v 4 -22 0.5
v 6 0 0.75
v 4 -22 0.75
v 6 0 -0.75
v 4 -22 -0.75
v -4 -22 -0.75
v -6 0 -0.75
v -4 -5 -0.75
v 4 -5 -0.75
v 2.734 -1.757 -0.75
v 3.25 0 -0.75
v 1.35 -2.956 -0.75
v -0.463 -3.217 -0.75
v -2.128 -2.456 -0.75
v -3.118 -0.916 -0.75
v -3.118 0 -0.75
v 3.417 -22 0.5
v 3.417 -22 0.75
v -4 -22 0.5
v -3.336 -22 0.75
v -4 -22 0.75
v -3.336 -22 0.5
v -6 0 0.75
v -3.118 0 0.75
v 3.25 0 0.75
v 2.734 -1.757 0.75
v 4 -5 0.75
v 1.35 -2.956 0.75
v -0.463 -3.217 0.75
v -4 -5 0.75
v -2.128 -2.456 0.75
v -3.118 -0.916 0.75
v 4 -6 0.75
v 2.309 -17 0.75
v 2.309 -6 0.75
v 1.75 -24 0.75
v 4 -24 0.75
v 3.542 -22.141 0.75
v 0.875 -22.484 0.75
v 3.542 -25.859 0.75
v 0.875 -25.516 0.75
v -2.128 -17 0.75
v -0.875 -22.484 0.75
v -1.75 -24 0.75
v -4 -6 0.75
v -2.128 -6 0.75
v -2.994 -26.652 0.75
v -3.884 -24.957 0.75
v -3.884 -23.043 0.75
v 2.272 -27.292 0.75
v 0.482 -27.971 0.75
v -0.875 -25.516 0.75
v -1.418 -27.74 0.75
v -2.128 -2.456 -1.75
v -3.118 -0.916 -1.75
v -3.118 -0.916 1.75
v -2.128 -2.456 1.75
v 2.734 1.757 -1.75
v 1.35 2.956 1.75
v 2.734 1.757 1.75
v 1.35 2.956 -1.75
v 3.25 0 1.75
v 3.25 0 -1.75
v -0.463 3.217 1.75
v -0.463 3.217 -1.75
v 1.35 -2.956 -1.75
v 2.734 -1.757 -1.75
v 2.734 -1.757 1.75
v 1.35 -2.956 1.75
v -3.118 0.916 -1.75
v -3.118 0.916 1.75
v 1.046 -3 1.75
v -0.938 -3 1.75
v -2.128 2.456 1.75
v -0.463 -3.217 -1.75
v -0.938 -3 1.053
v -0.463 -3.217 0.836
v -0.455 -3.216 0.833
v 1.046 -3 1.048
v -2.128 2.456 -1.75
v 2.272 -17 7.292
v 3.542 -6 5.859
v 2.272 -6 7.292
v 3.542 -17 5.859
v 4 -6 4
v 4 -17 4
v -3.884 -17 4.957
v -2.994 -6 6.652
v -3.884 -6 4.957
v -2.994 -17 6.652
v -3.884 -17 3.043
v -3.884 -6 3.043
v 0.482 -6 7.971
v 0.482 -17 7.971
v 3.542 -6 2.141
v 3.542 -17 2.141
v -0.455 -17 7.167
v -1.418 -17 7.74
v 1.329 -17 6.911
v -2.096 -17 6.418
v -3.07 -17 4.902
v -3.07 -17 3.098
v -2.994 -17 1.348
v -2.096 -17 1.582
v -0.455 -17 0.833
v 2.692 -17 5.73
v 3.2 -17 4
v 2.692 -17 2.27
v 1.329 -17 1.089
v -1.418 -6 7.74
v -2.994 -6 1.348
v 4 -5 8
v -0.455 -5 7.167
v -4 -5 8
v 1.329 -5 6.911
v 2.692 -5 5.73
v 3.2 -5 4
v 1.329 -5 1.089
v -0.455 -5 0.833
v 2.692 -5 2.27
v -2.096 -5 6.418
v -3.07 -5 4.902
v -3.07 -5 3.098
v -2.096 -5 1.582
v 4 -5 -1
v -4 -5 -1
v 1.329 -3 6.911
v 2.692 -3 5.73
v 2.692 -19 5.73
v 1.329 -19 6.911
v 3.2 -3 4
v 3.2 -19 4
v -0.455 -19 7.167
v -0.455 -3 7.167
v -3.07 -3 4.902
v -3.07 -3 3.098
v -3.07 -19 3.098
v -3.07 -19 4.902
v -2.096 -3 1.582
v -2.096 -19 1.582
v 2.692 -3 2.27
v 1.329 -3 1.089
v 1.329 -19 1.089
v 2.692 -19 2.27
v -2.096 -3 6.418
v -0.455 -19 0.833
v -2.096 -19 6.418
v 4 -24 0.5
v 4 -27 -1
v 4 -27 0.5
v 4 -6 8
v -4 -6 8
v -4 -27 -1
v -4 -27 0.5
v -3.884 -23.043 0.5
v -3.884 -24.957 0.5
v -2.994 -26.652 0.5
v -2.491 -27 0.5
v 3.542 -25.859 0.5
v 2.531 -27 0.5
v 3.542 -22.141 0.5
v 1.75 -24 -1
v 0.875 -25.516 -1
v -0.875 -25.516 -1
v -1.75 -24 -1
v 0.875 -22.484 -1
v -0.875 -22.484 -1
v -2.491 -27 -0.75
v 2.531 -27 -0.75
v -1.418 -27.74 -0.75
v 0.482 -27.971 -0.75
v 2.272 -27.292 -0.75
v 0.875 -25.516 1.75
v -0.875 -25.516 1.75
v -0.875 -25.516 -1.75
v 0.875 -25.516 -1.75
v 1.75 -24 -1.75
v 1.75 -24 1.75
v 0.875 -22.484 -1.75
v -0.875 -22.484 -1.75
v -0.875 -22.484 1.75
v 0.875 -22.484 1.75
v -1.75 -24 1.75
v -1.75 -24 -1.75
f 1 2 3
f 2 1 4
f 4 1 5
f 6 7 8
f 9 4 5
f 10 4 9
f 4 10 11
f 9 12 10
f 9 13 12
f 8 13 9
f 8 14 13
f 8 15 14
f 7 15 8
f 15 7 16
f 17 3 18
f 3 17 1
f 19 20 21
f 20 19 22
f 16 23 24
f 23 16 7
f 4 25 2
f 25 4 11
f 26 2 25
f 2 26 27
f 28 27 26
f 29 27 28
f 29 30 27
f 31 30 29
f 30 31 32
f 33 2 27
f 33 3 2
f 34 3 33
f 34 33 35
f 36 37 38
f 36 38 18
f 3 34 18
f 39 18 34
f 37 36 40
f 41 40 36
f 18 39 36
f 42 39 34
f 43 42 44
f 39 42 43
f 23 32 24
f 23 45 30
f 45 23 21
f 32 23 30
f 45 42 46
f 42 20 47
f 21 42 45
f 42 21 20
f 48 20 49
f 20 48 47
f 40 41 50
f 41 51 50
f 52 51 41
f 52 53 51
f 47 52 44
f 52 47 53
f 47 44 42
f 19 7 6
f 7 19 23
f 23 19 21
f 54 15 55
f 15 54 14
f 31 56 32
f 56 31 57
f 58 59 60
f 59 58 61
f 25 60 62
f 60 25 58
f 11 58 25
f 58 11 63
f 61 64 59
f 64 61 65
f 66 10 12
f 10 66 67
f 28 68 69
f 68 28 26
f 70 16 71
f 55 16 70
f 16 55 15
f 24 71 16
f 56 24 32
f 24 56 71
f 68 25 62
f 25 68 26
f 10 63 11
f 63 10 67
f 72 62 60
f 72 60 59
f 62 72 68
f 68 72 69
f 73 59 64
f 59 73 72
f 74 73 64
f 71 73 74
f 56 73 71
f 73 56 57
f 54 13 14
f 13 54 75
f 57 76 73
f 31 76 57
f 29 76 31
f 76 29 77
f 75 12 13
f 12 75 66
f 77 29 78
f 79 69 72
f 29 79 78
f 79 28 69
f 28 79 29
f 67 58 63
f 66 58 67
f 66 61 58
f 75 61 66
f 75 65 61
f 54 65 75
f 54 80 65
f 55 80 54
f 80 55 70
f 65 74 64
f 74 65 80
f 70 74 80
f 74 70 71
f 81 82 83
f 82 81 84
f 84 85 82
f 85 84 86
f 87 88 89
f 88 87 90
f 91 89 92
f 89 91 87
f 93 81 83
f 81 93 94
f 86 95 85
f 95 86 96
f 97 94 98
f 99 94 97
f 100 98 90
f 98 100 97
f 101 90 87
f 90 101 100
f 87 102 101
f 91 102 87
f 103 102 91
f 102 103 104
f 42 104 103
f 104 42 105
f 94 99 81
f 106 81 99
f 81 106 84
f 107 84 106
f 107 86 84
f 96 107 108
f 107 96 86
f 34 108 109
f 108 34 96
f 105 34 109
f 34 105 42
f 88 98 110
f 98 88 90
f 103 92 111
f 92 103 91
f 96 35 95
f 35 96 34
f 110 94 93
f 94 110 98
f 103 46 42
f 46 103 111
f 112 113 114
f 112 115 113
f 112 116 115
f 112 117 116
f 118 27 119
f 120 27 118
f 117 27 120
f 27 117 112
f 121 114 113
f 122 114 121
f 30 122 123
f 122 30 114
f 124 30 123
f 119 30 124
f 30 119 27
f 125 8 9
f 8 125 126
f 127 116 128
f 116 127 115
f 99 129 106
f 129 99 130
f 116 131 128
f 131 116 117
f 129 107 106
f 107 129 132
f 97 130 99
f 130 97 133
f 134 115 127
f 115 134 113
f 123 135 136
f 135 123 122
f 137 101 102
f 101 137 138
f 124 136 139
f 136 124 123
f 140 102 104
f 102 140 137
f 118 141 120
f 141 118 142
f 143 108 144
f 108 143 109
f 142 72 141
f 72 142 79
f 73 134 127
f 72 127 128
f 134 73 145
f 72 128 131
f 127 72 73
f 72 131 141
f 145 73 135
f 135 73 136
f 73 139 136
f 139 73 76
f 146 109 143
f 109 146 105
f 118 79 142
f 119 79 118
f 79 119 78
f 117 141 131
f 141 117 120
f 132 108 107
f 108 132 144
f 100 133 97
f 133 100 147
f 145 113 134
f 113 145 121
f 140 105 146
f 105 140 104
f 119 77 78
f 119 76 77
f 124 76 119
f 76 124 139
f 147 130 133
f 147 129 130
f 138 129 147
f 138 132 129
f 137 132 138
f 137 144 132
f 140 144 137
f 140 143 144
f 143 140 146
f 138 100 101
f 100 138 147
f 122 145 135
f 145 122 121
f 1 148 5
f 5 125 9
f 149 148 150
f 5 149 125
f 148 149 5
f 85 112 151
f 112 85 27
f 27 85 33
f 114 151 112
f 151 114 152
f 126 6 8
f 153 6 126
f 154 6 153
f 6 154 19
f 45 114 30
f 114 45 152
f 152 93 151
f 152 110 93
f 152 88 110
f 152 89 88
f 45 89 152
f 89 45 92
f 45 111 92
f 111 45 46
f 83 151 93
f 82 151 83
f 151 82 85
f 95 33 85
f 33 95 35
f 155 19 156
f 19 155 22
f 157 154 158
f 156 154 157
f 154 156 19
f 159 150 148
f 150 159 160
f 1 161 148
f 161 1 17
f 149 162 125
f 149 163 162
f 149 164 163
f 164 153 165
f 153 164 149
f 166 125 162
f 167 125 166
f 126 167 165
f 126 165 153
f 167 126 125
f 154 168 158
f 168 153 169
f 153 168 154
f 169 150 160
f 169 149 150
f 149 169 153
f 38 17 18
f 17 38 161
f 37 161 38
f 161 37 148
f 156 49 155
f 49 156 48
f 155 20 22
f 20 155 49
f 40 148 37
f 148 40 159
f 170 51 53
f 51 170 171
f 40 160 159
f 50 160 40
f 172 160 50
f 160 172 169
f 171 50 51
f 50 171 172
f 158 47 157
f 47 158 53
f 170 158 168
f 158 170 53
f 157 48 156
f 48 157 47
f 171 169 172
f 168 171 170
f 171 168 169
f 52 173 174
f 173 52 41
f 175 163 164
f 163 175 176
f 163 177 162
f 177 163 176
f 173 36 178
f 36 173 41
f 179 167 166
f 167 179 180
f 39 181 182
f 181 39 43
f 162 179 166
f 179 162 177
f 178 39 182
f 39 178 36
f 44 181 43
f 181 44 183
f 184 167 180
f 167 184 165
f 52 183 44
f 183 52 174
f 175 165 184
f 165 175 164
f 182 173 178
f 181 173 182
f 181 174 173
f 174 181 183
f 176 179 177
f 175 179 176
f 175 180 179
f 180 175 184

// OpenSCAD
// Parameters
t = 1.5; //[0.8:3:0.1]
w = 8; //[4:16:0.5]
od = 12; //[6:24:0.5]
id = 6.5; //[3:13:0.5]
l = 28; //[14:56:1]
crimp = 12; //[0:24:1]
angle = 45; //[0:90:1]
transition_length = 1; //[0.5:3:0.1]
hole_d = 3.5; //[0:8:0.5]
overlap = 1; //[0.5:2:0.1]
barrel_wall = 0.8; //[0.4:1.6:0.1]
barrel_od = 8; //[5:16:0.5]
tab_end_d = 8; //[4:16:0.5]

// Ring Terminal - complete geometry
module ring_terminal() {
  color("Silver") {
    // Ring Lug Body
    linear_extrude(height=t, center=true) {
      polygon(points=[
        [-od/2, 0],
        [od/2, 0],
        [w/2, -(l - od/2)],
        [-w/2, -(l - od/2)]
      ]);
    }
    
    // Ring Hole
    translate([0, 0, 0])
      cylinder(r=id/2, h=t + 2*overlap, center=true);
    
    // Tab or Neck Extension
    linear_extrude(height=t, center=true) {
      polygon(points=[
        [-w/2, -(od/2 - overlap)],
        [w/2, -(od/2 - overlap)],
        [w/2, -(l - od/2)],
        [-w/2, -(l - od/2)]
      ]);
    }
  }
}

// Ring Terminal Assembly - complete geometry
module ring_terminal_assembly() {
  color("Silver") {
    // Crimp Barrel Outer
    translate([0, -(od/2 + crimp/2 - overlap), w/2])
      rotate([90, 0, 0])
      cylinder(r=barrel_od/2, h=crimp, center=true);
    
    // Crimp Barrel Inner
    translate([0, -(od/2 + crimp/2 - overlap), w/2])
      rotate([90, 0, 0])
      cylinder(r=(barrel_od/2 - barrel_wall), h=crimp + 2*transition_length + 2*overlap, center=true);
    
    // Transition Fillet or Hull Blend
    translate([0, -(od/2 + transition_length/2 - overlap), w/2])
      cube([w, transition_length, w], center=true);
    
    // Bent Tab Plate
    translate([0, -(od/2 + (l - od/2)/2 - overlap), t/2 - overlap])
      cube([w, (l - od/2), t], center=true);
    
    // Bent Tab End Round
    translate([0, -(l - tab_end_d/2), 0])
      cylinder(r=tab_end_d/2, h=t, center=true);
    
    // Optional Aux Hole in Tab
    translate([0, -(l - tab_end_d/2), 0])
      cylinder(r=hole_d/2, h=t + 2*overlap, center=true);
  }
}

// Assembly
module assembly() {
  ring_terminal();
  ring_terminal_assembly();
}

assembly();
